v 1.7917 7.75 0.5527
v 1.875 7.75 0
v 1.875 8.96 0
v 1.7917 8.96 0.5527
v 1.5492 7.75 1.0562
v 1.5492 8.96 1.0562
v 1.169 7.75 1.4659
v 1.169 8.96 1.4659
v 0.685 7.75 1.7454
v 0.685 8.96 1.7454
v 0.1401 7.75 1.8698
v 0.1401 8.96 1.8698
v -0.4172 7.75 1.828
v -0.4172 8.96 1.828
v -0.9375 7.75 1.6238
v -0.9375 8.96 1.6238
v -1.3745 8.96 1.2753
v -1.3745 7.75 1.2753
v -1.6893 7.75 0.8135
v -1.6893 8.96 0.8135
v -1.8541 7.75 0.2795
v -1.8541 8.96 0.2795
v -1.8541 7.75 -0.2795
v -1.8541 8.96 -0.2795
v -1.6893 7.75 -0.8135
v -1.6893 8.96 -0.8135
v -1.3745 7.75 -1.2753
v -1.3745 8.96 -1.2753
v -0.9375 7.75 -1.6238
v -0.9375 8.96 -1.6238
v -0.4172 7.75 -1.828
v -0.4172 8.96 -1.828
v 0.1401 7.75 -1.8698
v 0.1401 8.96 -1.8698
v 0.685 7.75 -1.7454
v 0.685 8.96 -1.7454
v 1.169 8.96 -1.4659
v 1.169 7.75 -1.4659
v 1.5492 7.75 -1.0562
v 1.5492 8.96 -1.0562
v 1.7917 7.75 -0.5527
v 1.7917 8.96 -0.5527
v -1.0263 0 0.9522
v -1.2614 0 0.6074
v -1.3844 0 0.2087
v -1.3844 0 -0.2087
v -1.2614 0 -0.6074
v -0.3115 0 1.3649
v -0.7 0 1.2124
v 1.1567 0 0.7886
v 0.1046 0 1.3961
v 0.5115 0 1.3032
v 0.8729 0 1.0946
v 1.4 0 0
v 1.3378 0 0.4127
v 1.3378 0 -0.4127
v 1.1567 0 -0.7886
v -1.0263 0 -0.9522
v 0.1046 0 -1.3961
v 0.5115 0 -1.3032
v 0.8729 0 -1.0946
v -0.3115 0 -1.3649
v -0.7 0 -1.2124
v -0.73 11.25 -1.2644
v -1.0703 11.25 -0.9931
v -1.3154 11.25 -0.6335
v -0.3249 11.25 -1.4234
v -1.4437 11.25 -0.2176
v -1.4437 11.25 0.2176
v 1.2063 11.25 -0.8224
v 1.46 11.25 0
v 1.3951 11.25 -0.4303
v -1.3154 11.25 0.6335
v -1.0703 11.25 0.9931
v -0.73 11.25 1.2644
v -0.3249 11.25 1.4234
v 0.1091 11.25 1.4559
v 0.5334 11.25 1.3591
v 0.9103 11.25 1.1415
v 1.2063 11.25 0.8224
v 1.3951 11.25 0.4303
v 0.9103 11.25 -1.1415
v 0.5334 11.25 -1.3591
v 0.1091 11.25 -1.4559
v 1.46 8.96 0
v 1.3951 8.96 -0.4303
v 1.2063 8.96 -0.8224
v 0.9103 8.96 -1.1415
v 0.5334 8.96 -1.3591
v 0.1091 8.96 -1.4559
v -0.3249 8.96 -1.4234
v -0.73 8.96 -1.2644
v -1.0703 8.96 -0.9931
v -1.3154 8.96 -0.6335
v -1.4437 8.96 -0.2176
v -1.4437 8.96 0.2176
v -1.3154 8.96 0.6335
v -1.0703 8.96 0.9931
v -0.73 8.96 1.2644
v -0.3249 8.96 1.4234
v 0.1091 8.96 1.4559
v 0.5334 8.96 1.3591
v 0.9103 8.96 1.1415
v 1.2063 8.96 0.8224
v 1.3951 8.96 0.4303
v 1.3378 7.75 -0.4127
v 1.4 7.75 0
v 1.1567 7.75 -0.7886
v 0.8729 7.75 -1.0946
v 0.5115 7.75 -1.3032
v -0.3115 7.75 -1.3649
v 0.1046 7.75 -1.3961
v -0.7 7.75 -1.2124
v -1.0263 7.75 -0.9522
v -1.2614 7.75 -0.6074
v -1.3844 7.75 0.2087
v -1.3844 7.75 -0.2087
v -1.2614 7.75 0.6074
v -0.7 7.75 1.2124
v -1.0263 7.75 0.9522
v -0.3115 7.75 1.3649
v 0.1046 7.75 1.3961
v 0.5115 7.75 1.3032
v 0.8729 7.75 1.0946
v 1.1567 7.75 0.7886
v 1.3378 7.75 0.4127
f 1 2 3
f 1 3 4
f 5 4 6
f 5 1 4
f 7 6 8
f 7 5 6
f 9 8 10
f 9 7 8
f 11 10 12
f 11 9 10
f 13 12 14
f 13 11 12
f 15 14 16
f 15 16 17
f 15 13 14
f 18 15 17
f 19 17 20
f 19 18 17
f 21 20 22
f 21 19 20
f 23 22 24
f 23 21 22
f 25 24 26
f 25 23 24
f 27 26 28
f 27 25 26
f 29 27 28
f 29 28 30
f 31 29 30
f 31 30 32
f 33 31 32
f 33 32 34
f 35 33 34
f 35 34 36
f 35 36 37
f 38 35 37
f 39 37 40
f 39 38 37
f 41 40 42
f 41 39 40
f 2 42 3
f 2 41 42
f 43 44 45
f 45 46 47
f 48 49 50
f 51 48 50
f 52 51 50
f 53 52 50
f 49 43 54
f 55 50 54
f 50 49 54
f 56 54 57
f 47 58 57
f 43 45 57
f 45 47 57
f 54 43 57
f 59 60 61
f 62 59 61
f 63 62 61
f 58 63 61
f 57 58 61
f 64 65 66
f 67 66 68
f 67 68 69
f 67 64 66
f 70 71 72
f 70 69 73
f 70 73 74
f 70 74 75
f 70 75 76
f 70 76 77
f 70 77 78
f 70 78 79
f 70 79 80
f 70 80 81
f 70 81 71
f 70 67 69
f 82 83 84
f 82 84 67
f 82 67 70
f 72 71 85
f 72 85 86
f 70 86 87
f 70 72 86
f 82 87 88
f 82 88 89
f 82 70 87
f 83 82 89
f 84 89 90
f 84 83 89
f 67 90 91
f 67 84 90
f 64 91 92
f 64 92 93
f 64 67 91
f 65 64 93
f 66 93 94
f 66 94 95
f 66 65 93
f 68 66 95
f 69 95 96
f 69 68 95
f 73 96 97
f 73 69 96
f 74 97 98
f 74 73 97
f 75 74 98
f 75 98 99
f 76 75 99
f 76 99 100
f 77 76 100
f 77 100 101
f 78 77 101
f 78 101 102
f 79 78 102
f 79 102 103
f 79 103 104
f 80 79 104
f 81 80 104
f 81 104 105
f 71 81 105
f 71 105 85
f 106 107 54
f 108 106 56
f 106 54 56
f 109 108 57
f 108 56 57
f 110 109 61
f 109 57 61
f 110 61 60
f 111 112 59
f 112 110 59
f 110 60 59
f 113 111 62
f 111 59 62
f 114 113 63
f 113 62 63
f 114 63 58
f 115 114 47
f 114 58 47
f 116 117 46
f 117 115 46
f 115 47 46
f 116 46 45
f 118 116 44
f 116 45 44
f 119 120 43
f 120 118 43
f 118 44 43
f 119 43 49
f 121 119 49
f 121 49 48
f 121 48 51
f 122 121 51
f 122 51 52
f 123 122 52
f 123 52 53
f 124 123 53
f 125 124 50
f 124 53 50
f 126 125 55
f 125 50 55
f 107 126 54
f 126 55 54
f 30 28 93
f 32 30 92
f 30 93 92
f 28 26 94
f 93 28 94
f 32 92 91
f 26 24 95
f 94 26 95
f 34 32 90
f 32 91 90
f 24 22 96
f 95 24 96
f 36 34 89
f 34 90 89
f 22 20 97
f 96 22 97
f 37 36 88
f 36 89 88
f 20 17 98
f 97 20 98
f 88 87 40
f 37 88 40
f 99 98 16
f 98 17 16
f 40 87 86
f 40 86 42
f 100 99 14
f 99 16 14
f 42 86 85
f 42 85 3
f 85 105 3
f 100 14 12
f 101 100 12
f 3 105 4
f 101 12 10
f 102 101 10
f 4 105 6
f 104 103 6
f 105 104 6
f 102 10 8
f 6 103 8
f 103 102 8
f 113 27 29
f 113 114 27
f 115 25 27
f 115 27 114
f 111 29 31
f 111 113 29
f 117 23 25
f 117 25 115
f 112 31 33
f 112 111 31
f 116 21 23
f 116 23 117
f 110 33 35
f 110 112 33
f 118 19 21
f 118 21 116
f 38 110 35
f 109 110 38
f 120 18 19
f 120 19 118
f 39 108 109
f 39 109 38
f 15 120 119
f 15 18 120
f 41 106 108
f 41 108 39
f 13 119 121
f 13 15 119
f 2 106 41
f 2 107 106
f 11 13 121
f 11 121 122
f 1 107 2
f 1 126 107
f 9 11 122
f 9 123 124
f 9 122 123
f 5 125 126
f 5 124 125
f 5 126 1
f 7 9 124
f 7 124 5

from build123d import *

# Parameters (mm, degrees)
SKETCH1_R           = 1.4
BOSS_EXTRUDE1_DEPTH = 11.25
SKETCH2_R           = 1.46
BOSS_EXTRUDE2_DEPTH = 3.5
SKETCH3_R           = 1.875
BOSS_EXTRUDE3_DEPTH = 1.21


with BuildPart() as part:
    # Sketch1 → Boss-Extrude1 (new body)
    with BuildSketch(Plane(origin=(0, 0, 0), x_dir=(1, 0, 0), z_dir=(0, 1, 0))):
        Circle(SKETCH1_R)
    extrude(amount=BOSS_EXTRUDE1_DEPTH)

    # Sketch2 → Boss-Extrude2 (add)
    with BuildSketch(Plane(origin=(0, 11.25, 0), x_dir=(1, 0, 0), z_dir=(0, 1, 0))):
        Circle(SKETCH2_R)
    extrude(amount=-BOSS_EXTRUDE2_DEPTH)

    # Sketch3 → Boss-Extrude3 (add)
    with BuildSketch(Plane.XZ.offset(-7.75)):
        Circle(SKETCH3_R)
    extrude(amount=-BOSS_EXTRUDE3_DEPTH)


solid = part.part
